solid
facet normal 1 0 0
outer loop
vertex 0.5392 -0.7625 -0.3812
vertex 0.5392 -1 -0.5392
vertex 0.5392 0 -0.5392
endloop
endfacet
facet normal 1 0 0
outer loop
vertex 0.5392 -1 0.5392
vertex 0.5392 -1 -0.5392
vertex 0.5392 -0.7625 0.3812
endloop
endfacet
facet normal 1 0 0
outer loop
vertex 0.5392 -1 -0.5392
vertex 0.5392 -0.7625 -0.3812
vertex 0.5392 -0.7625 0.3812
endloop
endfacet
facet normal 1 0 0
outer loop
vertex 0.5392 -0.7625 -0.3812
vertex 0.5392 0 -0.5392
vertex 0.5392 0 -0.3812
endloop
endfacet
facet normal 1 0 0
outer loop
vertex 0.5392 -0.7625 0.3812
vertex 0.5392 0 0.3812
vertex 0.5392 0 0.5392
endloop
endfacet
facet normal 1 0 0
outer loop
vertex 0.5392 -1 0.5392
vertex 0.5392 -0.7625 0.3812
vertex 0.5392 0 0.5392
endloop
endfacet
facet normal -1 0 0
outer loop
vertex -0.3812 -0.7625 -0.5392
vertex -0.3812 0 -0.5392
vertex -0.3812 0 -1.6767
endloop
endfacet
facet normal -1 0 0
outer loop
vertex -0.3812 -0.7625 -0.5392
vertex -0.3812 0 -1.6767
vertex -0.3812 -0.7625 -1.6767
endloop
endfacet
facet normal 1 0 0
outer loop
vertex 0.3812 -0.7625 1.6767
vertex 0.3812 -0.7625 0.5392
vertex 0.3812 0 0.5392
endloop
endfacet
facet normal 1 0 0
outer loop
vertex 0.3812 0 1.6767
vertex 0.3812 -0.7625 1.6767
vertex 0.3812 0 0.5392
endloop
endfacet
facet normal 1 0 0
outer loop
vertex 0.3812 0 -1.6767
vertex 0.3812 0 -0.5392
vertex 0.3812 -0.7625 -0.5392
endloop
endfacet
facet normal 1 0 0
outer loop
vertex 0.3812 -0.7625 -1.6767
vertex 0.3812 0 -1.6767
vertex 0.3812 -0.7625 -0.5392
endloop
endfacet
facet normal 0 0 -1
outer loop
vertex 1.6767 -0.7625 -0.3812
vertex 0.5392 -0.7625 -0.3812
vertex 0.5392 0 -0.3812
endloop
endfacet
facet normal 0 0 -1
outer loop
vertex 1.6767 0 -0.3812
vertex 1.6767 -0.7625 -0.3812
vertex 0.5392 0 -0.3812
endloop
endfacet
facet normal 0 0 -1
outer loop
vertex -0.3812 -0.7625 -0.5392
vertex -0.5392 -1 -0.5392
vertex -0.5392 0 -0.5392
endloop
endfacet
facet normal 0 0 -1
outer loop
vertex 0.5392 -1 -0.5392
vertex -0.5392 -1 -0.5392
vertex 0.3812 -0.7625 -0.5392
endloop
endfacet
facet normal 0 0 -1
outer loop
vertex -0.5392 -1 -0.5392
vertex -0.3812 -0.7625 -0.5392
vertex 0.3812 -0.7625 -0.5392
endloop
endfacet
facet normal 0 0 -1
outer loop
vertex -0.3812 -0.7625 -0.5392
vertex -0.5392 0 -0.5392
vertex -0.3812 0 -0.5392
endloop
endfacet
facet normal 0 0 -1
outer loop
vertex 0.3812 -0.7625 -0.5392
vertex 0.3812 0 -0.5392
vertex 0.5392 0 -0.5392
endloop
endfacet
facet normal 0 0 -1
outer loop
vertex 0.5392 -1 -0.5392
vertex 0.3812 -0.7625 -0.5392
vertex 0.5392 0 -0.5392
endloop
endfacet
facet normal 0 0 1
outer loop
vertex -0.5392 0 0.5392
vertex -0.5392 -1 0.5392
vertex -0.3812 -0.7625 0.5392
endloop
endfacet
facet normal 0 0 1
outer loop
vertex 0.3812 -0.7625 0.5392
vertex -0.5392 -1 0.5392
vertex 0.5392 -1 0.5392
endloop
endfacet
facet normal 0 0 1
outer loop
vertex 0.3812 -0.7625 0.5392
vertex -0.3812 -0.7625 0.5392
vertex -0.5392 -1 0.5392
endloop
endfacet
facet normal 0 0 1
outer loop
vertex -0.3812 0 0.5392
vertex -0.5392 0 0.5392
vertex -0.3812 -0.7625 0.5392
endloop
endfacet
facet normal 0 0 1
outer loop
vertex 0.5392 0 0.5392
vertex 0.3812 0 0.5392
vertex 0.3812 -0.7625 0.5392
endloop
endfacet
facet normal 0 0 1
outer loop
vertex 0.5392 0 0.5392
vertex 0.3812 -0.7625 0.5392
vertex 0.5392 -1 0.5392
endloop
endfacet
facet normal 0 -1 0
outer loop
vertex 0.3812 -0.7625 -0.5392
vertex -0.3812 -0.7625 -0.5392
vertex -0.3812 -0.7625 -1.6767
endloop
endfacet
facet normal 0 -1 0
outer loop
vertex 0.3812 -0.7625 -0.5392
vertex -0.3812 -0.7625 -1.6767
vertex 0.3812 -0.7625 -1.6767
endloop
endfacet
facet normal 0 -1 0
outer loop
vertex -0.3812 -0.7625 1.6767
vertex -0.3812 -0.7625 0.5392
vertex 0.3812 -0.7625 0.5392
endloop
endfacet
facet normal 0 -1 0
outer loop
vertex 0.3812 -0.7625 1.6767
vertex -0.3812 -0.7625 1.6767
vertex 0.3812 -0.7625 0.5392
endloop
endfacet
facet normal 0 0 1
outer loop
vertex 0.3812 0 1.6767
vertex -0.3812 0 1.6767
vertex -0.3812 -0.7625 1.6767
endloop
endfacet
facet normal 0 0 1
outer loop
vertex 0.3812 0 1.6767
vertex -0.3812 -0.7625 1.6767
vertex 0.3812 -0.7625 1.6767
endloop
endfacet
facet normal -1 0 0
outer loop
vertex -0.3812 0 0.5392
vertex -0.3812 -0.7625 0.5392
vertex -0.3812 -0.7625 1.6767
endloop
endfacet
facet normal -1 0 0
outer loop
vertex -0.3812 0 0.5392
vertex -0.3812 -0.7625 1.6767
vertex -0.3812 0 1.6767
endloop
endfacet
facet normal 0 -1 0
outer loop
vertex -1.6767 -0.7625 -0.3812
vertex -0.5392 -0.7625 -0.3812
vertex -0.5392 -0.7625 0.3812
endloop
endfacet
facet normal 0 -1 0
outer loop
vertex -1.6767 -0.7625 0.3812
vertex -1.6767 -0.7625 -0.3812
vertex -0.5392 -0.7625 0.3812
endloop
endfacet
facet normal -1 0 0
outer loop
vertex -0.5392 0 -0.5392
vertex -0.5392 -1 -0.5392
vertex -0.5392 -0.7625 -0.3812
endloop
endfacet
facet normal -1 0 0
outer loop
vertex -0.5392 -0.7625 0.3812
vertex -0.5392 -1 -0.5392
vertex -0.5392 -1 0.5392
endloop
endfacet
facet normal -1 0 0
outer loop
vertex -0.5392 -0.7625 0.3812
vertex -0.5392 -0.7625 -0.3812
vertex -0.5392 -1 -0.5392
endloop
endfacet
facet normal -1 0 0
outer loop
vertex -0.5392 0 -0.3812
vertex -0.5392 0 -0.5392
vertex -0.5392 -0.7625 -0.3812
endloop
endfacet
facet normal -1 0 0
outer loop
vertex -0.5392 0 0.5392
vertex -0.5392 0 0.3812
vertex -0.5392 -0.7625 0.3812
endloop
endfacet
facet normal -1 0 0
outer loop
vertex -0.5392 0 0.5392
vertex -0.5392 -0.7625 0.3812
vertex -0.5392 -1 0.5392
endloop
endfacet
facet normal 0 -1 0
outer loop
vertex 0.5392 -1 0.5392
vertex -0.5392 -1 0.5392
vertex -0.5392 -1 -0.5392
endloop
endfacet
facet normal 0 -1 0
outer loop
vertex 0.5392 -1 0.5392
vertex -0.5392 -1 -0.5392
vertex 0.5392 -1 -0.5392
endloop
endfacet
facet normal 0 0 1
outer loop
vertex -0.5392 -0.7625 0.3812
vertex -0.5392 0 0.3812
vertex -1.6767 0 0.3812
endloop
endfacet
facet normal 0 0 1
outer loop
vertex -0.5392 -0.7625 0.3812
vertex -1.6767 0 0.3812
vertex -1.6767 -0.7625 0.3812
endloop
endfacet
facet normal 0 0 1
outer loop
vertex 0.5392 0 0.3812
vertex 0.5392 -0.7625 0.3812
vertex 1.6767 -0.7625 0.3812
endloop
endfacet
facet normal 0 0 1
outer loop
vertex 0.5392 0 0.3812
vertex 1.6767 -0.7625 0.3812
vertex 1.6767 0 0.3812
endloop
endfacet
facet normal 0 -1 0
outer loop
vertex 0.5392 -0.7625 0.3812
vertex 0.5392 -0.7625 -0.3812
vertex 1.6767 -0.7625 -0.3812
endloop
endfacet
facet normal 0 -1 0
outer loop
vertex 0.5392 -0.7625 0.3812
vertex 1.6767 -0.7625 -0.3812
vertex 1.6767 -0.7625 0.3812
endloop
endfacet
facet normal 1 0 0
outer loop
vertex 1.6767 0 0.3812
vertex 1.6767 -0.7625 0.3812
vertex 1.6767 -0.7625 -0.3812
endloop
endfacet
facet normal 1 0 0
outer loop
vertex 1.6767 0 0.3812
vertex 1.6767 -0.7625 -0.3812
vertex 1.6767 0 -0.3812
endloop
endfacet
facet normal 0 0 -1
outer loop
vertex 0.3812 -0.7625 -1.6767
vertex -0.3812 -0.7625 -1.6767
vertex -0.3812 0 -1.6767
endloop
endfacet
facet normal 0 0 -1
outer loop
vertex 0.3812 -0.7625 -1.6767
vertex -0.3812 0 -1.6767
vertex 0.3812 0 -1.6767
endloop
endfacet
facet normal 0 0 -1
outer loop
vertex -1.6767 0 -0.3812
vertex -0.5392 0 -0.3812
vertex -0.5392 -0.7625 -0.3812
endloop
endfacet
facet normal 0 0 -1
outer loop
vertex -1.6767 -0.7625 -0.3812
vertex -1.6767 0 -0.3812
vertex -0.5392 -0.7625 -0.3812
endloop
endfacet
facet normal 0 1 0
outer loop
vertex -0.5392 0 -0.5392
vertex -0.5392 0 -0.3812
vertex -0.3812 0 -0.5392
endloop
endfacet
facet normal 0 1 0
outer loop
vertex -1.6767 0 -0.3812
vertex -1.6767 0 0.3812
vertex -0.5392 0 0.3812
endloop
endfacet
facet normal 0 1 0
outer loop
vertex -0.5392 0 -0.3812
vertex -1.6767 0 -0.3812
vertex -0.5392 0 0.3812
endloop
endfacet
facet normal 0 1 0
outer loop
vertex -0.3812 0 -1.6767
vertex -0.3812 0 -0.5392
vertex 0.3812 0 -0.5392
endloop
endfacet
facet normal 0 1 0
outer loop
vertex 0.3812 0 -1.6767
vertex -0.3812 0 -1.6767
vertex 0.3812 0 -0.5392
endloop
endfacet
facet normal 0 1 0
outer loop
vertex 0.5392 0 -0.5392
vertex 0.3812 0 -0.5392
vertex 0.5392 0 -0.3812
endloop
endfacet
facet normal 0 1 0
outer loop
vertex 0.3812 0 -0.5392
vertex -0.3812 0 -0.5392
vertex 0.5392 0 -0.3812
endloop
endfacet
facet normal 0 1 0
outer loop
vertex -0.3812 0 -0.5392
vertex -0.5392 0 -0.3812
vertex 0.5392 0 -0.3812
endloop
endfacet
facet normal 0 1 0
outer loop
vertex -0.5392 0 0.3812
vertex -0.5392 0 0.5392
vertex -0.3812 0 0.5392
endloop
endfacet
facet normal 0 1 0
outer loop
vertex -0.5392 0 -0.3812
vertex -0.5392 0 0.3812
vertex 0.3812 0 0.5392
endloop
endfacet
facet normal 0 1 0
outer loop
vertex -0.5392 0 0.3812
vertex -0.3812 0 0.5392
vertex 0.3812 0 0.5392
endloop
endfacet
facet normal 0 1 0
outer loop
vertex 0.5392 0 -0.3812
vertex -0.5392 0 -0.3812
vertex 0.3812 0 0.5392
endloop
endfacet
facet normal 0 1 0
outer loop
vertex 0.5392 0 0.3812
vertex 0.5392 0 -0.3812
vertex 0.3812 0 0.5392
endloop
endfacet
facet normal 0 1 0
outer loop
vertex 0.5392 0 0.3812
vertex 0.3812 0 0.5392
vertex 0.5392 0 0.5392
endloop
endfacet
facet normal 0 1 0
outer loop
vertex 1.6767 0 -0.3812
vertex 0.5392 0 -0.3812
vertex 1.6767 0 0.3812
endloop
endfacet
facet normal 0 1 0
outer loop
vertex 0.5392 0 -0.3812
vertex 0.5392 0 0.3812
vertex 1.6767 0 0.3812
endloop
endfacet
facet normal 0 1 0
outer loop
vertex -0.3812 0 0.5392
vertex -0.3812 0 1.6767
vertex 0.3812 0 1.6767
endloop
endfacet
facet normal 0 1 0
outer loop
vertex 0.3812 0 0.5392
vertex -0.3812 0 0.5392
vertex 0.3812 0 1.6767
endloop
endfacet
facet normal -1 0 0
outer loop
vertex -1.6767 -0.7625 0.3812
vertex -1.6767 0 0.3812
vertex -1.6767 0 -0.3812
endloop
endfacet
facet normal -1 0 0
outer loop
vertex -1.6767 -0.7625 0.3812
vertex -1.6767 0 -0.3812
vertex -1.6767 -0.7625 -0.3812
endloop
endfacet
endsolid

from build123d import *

# Parameters (mm, degrees)
F0_W     = 1.07834
F0_H     = 1.07834
F1_DEPTH = 1
F2_W     = 0.7625
F2_H     = 0.7625
F3_DEPTH = 1.1375
F4_W     = 0.7625
F4_H     = 0.7625
F5_DEPTH = 1.1375
F6_W     = 0.7625
F6_H     = 0.7625
F7_DEPTH = 1.1375
F8_W     = 0.7625
F8_H     = 0.7625
F9_DEPTH = 1.1375


with BuildPart() as f1:
    # F0 (on Front) → F1 (new body)
    with BuildSketch(Plane.XZ):
        Rectangle(F0_W, F0_H)
    extrude(amount=F1_DEPTH)

    # F2 (on face) → F3 (join)
    with BuildSketch(Plane(origin=(0, 0, -0.53917), x_dir=(1, 0, 0), z_dir=(0, 0, -1))):
        with Locations((0, 0.38125)):
            Rectangle(F2_W, F2_H)
    extrude(amount=F3_DEPTH)

    # F4 (on face) → F5 (join)
    with BuildSketch(Plane(origin=(-0.53917, 0, 0), x_dir=(0, -1, 0), z_dir=(-1, 0, 0))):
        with Locations((0.38125, 0)):
            Rectangle(F4_W, F4_H)
    extrude(amount=F5_DEPTH)

    # F6 (on face) → F7 (join)
    with BuildSketch(Plane.XY.offset(0.53917)):
        with Locations((0, -0.38125)):
            Rectangle(F6_W, F6_H)
    extrude(amount=F7_DEPTH)

    # F8 (on face) → F9 (join)
    with BuildSketch(Plane.YZ.offset(0.53917)):
        with Locations((-0.38125, 0)):
            Rectangle(F8_W, F8_H)
    extrude(amount=F9_DEPTH)


solid = f1.part
